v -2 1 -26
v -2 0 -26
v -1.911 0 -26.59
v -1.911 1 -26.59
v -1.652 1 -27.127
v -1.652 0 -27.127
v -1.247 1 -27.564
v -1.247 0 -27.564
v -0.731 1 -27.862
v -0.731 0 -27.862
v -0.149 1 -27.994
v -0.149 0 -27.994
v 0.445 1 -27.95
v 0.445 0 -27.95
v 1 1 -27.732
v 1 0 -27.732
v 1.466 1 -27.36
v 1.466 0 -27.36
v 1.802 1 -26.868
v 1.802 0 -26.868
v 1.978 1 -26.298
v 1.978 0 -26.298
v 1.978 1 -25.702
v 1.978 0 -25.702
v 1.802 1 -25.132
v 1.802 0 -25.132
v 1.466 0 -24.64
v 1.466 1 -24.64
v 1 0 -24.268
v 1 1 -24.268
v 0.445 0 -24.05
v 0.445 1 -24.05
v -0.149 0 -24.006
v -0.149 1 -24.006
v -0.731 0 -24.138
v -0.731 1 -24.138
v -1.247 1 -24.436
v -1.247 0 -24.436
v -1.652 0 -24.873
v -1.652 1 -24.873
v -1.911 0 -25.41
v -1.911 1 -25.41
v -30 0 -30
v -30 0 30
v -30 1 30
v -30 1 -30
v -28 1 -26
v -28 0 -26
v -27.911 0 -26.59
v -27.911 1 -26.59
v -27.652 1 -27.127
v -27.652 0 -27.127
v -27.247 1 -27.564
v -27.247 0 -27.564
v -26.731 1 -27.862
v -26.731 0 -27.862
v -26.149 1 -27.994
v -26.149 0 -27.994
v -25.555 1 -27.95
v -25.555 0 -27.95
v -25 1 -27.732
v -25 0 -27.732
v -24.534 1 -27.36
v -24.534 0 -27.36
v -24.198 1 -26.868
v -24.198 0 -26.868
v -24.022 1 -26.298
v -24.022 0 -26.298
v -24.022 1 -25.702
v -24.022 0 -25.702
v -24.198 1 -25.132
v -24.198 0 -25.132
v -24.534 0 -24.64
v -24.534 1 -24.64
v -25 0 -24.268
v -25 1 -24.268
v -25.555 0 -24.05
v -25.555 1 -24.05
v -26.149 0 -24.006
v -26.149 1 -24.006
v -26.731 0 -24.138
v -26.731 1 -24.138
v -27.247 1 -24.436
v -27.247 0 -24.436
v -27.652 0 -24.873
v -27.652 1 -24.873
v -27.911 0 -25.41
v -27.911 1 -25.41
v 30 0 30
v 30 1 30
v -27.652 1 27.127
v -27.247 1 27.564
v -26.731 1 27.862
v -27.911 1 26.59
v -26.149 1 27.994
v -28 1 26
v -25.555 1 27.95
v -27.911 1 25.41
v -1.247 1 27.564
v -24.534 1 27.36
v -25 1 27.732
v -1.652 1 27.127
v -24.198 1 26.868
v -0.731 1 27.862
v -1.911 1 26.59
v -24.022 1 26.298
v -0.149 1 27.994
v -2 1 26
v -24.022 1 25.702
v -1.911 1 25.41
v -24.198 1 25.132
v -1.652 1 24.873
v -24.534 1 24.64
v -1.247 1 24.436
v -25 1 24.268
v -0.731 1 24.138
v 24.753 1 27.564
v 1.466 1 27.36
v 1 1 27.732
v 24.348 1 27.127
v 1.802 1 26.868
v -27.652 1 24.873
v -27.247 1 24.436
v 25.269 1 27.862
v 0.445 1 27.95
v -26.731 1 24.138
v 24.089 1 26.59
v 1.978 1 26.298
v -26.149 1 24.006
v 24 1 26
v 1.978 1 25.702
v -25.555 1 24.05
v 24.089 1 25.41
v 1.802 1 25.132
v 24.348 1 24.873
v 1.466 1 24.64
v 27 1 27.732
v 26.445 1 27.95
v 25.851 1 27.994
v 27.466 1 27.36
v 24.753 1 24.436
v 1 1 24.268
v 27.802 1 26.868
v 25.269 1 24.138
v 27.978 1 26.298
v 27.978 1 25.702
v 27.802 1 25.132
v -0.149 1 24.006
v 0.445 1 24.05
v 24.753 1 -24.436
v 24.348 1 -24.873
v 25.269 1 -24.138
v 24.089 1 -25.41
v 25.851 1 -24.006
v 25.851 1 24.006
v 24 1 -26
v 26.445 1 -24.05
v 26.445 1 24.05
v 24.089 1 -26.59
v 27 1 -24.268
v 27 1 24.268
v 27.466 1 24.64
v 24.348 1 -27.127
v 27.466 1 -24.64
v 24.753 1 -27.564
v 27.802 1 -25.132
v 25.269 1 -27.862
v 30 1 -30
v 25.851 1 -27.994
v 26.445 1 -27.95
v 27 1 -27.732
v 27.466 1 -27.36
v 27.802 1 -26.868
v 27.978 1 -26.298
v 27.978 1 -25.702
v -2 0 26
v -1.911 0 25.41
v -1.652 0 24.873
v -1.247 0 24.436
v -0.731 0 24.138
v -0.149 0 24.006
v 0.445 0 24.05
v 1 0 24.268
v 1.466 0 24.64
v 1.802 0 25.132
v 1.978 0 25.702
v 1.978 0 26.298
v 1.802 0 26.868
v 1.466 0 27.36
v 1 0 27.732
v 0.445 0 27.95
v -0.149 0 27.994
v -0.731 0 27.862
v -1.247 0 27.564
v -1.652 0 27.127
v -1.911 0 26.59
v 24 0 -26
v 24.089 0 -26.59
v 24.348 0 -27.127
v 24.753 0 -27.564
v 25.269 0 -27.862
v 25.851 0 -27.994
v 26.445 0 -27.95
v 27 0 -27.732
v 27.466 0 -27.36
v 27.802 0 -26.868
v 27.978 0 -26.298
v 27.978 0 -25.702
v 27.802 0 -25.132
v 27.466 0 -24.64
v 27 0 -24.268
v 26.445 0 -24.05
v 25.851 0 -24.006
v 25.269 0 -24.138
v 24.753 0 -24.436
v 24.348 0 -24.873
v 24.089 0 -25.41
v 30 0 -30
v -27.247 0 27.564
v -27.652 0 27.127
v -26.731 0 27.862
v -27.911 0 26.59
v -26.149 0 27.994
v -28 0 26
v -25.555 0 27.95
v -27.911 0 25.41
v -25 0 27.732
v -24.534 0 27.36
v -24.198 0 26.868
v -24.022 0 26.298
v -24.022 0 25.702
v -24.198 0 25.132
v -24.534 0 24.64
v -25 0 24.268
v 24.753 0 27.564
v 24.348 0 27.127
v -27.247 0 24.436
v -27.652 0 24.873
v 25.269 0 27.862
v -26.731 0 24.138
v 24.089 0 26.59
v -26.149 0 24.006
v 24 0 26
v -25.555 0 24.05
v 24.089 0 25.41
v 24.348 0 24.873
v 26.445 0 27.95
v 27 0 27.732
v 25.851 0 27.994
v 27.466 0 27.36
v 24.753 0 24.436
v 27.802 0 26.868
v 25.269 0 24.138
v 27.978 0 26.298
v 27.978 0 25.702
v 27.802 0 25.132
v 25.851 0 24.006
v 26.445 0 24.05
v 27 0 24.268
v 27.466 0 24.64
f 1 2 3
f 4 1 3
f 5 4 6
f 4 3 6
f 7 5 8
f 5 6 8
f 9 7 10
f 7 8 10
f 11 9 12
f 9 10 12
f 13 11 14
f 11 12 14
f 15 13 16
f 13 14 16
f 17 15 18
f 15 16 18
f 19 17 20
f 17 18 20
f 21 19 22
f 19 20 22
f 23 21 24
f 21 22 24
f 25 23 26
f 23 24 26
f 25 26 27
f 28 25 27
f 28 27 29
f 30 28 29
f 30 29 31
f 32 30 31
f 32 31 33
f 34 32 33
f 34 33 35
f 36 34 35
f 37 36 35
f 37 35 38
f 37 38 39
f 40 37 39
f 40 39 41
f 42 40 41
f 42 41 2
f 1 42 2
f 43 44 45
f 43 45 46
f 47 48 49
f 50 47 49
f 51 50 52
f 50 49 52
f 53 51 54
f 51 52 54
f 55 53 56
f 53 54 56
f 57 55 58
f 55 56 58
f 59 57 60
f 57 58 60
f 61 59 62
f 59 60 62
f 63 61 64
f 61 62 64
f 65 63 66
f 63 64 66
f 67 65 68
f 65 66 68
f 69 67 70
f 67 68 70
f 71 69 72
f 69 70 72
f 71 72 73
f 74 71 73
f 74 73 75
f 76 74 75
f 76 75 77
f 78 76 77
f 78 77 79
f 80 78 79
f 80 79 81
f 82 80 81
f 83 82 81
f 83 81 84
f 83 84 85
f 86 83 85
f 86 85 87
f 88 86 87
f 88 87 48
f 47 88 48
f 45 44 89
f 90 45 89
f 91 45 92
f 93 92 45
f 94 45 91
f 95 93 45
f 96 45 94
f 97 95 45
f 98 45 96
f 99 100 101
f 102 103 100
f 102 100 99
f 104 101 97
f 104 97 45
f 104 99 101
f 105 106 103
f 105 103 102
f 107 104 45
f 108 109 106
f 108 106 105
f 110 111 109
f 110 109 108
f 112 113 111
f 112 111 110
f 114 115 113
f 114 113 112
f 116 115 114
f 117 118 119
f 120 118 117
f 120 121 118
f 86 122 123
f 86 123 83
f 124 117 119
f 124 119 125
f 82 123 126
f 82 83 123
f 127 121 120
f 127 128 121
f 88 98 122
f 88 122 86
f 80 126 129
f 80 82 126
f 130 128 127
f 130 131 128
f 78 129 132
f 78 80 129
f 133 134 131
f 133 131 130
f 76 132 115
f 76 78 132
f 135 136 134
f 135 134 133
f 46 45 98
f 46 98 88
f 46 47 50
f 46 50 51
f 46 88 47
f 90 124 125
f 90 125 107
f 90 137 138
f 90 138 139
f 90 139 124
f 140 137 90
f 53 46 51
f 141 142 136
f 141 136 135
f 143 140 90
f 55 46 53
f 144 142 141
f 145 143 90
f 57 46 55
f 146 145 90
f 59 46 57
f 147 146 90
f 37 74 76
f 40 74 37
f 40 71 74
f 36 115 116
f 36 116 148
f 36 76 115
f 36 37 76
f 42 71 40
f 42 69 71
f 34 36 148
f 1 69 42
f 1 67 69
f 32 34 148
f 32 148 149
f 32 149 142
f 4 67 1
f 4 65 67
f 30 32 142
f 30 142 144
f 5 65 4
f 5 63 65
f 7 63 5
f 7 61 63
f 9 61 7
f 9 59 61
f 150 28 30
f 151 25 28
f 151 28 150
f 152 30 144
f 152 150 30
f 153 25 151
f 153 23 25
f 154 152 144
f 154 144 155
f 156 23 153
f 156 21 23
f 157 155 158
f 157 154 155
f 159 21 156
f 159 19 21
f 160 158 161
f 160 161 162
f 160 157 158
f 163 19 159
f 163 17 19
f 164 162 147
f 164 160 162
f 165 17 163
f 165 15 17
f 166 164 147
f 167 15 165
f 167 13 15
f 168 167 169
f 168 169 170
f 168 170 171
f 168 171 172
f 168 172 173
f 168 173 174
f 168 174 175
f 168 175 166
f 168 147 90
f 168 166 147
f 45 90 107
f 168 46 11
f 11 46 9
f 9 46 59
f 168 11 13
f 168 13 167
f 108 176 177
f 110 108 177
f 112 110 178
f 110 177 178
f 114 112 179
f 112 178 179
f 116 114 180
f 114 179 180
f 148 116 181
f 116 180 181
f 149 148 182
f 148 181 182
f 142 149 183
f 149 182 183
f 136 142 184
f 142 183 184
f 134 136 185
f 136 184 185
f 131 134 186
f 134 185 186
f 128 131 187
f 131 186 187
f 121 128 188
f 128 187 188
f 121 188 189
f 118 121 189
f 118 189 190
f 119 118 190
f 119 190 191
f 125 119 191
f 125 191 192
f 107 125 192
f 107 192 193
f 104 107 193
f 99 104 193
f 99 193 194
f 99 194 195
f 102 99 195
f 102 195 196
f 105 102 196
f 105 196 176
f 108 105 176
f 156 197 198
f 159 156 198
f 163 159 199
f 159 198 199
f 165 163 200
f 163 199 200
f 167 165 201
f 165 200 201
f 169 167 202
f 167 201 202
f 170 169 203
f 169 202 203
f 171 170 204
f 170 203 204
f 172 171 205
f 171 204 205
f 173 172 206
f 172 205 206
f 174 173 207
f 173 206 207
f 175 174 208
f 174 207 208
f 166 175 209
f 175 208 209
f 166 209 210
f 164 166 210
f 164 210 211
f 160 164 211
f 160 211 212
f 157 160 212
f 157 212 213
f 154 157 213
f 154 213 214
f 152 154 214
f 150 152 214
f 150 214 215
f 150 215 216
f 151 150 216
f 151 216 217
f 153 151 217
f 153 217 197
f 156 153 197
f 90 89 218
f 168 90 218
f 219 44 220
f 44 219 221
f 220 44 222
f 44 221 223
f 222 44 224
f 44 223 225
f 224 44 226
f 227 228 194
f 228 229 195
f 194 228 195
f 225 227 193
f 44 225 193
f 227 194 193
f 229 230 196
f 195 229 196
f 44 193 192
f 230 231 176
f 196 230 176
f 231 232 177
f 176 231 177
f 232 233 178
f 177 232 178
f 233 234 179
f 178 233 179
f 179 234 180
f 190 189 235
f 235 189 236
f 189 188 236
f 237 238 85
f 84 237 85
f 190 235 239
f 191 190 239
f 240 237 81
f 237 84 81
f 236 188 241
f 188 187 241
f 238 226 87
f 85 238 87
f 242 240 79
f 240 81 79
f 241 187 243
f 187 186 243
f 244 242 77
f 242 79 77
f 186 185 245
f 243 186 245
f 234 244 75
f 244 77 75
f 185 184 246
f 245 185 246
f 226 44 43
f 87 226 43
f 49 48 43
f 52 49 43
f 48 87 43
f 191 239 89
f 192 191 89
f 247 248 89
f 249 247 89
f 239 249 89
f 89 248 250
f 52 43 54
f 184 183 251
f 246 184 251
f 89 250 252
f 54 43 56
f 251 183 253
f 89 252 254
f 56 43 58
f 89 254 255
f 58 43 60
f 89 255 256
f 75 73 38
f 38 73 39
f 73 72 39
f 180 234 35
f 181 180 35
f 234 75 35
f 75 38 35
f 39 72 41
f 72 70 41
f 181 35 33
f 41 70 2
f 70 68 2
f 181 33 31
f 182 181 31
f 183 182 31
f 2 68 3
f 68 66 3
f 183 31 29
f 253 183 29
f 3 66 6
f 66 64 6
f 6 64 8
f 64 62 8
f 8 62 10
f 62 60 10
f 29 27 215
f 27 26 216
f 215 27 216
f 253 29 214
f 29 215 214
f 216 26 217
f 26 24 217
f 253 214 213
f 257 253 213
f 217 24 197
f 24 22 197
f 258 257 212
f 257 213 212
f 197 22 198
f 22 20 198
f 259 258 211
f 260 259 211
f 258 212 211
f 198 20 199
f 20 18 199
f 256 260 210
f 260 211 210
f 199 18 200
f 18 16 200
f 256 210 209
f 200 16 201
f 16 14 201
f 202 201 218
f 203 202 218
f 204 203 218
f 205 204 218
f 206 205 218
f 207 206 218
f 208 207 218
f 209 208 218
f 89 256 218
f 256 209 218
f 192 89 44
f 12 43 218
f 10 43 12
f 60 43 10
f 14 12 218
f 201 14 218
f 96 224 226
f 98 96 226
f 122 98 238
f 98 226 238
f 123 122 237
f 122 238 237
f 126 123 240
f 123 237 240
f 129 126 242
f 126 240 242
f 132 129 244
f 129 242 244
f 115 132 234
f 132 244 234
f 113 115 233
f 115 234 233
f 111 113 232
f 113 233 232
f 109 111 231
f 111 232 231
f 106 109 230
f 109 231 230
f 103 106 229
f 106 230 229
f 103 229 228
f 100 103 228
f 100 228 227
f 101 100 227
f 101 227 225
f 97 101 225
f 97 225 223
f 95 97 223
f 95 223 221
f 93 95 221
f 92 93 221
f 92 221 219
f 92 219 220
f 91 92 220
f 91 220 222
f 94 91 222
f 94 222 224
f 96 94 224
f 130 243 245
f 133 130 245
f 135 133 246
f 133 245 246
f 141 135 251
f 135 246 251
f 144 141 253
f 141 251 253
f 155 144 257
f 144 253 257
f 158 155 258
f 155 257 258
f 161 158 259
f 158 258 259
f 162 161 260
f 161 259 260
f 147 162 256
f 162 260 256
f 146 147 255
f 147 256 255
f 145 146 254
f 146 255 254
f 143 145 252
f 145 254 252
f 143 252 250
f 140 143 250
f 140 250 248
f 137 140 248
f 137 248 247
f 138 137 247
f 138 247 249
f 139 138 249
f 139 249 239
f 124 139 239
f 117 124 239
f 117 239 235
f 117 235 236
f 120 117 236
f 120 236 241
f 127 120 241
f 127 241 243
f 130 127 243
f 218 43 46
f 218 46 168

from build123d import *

# Parameters (mm, degrees)
SKETCH1_W                    = 60
SKETCH1_H                    = 60
BOSS_EXTRUDE1_DEPTH          = 1
F_4_0_4_DIAMETER_HOLE1_D     = 4
F_4_0_4_DIAMETER_HOLE1_DEPTH = 1


with BuildPart() as part:
    # Sketch1 → Boss-Extrude1 (new body)
    with BuildSketch(Plane(origin=(0, 0, 0), x_dir=(1, 0, 0), z_dir=(0, 1, 0))):
        Rectangle(SKETCH1_W, SKETCH1_H)
    extrude(amount=BOSS_EXTRUDE1_DEPTH)

    # Ø4.0 (4) Diameter Hole1
    with Locations(Plane(origin=(0, 1, 0), x_dir=(1, 0, 0), z_dir=(0, 1, 0))):
        with Locations((26, 26), (0, 26), (-26, 26), (0, -26), (26, -26), (-26, -26)):
            Hole(F_4_0_4_DIAMETER_HOLE1_D / 2, depth=F_4_0_4_DIAMETER_HOLE1_DEPTH)


solid = part.part
